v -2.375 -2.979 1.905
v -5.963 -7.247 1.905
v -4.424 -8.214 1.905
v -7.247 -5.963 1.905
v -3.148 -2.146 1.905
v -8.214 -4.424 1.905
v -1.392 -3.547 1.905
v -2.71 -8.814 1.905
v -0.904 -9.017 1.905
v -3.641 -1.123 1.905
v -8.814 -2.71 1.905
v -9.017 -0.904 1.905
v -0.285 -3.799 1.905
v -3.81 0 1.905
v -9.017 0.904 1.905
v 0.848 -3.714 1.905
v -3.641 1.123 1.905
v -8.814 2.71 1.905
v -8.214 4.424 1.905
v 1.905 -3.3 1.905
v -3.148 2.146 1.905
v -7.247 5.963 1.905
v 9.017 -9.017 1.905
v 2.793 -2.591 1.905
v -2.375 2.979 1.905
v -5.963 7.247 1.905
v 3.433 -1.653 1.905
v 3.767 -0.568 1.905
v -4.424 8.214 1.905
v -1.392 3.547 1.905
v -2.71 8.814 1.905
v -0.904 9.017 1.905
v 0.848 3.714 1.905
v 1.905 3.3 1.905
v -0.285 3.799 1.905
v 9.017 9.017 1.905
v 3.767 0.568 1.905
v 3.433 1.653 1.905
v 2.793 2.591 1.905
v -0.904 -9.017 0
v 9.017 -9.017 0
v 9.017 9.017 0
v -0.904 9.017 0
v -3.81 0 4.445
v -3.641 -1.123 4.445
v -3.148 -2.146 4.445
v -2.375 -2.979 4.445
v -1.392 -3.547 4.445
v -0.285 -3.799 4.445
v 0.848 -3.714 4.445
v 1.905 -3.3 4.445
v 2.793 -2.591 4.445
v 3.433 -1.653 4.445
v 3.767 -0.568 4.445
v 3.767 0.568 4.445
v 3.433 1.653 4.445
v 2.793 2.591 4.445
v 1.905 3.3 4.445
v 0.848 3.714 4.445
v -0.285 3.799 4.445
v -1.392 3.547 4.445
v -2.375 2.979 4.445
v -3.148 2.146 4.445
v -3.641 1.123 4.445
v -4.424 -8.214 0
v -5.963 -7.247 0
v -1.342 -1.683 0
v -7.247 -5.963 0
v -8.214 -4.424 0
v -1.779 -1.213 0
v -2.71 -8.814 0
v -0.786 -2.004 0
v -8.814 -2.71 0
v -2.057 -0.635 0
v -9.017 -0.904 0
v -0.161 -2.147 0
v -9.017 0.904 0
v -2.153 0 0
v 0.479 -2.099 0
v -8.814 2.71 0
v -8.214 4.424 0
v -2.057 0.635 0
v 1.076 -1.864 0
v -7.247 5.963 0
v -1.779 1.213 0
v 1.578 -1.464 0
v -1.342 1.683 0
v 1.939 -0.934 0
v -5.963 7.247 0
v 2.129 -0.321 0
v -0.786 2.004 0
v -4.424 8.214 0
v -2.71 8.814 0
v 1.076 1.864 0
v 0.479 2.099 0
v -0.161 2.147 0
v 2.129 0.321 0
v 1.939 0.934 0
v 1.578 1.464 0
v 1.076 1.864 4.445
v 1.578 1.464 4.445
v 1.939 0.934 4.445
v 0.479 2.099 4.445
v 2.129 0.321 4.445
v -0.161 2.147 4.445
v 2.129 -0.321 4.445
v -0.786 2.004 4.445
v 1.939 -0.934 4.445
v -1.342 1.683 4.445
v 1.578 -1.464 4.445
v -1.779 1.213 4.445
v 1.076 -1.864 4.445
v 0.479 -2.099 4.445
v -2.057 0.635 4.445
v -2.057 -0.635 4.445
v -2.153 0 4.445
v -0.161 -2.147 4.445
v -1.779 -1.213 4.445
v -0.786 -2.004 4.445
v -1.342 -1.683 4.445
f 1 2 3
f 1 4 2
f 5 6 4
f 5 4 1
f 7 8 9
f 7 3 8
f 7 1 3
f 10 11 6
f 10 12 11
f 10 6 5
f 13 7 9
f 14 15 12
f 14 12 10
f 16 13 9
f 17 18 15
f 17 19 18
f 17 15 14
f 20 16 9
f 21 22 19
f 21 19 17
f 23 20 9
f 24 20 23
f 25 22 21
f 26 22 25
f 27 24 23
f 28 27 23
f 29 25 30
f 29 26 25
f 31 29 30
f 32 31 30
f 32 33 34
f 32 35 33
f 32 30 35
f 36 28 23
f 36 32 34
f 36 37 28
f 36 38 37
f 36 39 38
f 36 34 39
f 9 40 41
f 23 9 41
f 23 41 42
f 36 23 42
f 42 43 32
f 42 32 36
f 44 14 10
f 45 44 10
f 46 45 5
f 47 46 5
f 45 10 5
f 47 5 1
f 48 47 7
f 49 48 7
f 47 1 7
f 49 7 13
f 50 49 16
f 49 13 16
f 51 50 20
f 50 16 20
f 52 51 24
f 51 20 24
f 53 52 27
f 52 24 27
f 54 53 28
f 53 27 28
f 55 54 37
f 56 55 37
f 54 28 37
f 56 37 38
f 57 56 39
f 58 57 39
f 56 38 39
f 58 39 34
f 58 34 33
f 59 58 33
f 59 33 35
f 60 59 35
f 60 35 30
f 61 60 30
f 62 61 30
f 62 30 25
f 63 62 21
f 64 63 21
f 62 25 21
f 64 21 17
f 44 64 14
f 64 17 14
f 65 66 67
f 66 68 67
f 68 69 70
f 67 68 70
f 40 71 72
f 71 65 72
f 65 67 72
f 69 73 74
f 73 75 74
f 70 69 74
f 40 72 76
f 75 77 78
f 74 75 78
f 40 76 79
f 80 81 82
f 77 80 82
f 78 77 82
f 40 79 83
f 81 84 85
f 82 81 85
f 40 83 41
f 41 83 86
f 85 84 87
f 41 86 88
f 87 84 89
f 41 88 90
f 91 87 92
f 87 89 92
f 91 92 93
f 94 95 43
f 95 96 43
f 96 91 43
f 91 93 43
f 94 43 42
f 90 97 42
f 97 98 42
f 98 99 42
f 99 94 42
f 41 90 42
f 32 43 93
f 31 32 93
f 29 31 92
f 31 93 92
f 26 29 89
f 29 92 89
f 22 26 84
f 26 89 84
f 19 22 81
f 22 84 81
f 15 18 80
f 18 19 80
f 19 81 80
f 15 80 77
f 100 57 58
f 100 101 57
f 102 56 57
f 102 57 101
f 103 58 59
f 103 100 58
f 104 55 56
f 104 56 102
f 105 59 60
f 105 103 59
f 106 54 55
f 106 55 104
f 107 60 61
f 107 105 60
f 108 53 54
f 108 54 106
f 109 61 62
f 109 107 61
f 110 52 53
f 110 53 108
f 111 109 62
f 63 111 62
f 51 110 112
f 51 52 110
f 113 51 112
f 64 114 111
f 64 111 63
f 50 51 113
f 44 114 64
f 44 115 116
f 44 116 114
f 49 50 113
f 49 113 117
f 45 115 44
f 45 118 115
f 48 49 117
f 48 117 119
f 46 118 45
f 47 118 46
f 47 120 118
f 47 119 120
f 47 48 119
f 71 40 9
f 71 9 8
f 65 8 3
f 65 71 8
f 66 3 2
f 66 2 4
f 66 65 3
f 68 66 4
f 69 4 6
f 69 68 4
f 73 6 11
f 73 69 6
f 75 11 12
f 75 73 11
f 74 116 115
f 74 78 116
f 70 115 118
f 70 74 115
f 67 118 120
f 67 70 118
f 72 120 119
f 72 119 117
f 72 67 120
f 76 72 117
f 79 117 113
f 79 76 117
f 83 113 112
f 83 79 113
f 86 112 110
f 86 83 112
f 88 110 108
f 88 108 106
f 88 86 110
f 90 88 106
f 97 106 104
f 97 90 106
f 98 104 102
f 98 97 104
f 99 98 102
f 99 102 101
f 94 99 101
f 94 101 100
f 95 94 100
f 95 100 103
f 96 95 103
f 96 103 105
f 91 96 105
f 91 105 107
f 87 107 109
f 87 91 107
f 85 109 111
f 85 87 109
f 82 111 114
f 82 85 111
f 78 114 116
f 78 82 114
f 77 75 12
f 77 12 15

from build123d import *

# Parameters (mm, degrees)
SKETCH1_W           = 18.034
SKETCH1_H           = 18.034
SKETCH1_R           = 2.15265
BOSS_EXTRUDE1_DEPTH = 1.905
SKETCH2_R           = 3.81
SKETCH2_R_2         = 2.15265
BOSS_EXTRUDE2_DEPTH = 2.54
CUT_EXTRUDE1_DEPTH  = 14.504466039


with BuildPart() as part:
    # Sketch1 → Boss-Extrude1 (new body)
    with BuildSketch(Plane.XY):
        Rectangle(SKETCH1_W, SKETCH1_H)
        with Locations(Location((0, 0, 0), (0, 0, 180))):
            Circle(SKETCH1_R, mode=Mode.SUBTRACT)
    extrude(amount=BOSS_EXTRUDE1_DEPTH)

    # Sketch2 → Boss-Extrude2 (add)
    with BuildSketch(Plane.XY.offset(1.905)):
        with Locations(Location((0, 0, 0), (0, 0, 180))):
            Circle(SKETCH2_R)
        with Locations(Location((0, 0, 0), (0, 0, 180))):
            Circle(SKETCH2_R_2, mode=Mode.SUBTRACT)
    extrude(amount=BOSS_EXTRUDE2_DEPTH)

    # Sketch3 → Cut-Extrude1 (cut, through all)
    with BuildSketch(Plane(origin=(0, 0, 0), x_dir=(-1, 0, 0), z_dir=(0, 0, -1))):
        with BuildLine():
            Line((9.017, 0.904485111), (9.017, 9.017))
            Line((9.017, 9.017), (0.904485111, 9.017))
            ThreePointArc((0.904485111, 9.017), (6.640899402, 6.640899402), (9.017, 0.904485111))
        make_face()
        with BuildLine():
            Line((9.017, -9.017), (0.904485111, -9.017))
            ThreePointArc((0.904485111, -9.017), (6.640899402, -6.640899402), (9.017, -0.904485111))
            Line((9.017, -0.904485111), (9.017, -9.017))
        make_face()
    extrude(amount=-CUT_EXTRUDE1_DEPTH, mode=Mode.SUBTRACT)


solid = part.part
